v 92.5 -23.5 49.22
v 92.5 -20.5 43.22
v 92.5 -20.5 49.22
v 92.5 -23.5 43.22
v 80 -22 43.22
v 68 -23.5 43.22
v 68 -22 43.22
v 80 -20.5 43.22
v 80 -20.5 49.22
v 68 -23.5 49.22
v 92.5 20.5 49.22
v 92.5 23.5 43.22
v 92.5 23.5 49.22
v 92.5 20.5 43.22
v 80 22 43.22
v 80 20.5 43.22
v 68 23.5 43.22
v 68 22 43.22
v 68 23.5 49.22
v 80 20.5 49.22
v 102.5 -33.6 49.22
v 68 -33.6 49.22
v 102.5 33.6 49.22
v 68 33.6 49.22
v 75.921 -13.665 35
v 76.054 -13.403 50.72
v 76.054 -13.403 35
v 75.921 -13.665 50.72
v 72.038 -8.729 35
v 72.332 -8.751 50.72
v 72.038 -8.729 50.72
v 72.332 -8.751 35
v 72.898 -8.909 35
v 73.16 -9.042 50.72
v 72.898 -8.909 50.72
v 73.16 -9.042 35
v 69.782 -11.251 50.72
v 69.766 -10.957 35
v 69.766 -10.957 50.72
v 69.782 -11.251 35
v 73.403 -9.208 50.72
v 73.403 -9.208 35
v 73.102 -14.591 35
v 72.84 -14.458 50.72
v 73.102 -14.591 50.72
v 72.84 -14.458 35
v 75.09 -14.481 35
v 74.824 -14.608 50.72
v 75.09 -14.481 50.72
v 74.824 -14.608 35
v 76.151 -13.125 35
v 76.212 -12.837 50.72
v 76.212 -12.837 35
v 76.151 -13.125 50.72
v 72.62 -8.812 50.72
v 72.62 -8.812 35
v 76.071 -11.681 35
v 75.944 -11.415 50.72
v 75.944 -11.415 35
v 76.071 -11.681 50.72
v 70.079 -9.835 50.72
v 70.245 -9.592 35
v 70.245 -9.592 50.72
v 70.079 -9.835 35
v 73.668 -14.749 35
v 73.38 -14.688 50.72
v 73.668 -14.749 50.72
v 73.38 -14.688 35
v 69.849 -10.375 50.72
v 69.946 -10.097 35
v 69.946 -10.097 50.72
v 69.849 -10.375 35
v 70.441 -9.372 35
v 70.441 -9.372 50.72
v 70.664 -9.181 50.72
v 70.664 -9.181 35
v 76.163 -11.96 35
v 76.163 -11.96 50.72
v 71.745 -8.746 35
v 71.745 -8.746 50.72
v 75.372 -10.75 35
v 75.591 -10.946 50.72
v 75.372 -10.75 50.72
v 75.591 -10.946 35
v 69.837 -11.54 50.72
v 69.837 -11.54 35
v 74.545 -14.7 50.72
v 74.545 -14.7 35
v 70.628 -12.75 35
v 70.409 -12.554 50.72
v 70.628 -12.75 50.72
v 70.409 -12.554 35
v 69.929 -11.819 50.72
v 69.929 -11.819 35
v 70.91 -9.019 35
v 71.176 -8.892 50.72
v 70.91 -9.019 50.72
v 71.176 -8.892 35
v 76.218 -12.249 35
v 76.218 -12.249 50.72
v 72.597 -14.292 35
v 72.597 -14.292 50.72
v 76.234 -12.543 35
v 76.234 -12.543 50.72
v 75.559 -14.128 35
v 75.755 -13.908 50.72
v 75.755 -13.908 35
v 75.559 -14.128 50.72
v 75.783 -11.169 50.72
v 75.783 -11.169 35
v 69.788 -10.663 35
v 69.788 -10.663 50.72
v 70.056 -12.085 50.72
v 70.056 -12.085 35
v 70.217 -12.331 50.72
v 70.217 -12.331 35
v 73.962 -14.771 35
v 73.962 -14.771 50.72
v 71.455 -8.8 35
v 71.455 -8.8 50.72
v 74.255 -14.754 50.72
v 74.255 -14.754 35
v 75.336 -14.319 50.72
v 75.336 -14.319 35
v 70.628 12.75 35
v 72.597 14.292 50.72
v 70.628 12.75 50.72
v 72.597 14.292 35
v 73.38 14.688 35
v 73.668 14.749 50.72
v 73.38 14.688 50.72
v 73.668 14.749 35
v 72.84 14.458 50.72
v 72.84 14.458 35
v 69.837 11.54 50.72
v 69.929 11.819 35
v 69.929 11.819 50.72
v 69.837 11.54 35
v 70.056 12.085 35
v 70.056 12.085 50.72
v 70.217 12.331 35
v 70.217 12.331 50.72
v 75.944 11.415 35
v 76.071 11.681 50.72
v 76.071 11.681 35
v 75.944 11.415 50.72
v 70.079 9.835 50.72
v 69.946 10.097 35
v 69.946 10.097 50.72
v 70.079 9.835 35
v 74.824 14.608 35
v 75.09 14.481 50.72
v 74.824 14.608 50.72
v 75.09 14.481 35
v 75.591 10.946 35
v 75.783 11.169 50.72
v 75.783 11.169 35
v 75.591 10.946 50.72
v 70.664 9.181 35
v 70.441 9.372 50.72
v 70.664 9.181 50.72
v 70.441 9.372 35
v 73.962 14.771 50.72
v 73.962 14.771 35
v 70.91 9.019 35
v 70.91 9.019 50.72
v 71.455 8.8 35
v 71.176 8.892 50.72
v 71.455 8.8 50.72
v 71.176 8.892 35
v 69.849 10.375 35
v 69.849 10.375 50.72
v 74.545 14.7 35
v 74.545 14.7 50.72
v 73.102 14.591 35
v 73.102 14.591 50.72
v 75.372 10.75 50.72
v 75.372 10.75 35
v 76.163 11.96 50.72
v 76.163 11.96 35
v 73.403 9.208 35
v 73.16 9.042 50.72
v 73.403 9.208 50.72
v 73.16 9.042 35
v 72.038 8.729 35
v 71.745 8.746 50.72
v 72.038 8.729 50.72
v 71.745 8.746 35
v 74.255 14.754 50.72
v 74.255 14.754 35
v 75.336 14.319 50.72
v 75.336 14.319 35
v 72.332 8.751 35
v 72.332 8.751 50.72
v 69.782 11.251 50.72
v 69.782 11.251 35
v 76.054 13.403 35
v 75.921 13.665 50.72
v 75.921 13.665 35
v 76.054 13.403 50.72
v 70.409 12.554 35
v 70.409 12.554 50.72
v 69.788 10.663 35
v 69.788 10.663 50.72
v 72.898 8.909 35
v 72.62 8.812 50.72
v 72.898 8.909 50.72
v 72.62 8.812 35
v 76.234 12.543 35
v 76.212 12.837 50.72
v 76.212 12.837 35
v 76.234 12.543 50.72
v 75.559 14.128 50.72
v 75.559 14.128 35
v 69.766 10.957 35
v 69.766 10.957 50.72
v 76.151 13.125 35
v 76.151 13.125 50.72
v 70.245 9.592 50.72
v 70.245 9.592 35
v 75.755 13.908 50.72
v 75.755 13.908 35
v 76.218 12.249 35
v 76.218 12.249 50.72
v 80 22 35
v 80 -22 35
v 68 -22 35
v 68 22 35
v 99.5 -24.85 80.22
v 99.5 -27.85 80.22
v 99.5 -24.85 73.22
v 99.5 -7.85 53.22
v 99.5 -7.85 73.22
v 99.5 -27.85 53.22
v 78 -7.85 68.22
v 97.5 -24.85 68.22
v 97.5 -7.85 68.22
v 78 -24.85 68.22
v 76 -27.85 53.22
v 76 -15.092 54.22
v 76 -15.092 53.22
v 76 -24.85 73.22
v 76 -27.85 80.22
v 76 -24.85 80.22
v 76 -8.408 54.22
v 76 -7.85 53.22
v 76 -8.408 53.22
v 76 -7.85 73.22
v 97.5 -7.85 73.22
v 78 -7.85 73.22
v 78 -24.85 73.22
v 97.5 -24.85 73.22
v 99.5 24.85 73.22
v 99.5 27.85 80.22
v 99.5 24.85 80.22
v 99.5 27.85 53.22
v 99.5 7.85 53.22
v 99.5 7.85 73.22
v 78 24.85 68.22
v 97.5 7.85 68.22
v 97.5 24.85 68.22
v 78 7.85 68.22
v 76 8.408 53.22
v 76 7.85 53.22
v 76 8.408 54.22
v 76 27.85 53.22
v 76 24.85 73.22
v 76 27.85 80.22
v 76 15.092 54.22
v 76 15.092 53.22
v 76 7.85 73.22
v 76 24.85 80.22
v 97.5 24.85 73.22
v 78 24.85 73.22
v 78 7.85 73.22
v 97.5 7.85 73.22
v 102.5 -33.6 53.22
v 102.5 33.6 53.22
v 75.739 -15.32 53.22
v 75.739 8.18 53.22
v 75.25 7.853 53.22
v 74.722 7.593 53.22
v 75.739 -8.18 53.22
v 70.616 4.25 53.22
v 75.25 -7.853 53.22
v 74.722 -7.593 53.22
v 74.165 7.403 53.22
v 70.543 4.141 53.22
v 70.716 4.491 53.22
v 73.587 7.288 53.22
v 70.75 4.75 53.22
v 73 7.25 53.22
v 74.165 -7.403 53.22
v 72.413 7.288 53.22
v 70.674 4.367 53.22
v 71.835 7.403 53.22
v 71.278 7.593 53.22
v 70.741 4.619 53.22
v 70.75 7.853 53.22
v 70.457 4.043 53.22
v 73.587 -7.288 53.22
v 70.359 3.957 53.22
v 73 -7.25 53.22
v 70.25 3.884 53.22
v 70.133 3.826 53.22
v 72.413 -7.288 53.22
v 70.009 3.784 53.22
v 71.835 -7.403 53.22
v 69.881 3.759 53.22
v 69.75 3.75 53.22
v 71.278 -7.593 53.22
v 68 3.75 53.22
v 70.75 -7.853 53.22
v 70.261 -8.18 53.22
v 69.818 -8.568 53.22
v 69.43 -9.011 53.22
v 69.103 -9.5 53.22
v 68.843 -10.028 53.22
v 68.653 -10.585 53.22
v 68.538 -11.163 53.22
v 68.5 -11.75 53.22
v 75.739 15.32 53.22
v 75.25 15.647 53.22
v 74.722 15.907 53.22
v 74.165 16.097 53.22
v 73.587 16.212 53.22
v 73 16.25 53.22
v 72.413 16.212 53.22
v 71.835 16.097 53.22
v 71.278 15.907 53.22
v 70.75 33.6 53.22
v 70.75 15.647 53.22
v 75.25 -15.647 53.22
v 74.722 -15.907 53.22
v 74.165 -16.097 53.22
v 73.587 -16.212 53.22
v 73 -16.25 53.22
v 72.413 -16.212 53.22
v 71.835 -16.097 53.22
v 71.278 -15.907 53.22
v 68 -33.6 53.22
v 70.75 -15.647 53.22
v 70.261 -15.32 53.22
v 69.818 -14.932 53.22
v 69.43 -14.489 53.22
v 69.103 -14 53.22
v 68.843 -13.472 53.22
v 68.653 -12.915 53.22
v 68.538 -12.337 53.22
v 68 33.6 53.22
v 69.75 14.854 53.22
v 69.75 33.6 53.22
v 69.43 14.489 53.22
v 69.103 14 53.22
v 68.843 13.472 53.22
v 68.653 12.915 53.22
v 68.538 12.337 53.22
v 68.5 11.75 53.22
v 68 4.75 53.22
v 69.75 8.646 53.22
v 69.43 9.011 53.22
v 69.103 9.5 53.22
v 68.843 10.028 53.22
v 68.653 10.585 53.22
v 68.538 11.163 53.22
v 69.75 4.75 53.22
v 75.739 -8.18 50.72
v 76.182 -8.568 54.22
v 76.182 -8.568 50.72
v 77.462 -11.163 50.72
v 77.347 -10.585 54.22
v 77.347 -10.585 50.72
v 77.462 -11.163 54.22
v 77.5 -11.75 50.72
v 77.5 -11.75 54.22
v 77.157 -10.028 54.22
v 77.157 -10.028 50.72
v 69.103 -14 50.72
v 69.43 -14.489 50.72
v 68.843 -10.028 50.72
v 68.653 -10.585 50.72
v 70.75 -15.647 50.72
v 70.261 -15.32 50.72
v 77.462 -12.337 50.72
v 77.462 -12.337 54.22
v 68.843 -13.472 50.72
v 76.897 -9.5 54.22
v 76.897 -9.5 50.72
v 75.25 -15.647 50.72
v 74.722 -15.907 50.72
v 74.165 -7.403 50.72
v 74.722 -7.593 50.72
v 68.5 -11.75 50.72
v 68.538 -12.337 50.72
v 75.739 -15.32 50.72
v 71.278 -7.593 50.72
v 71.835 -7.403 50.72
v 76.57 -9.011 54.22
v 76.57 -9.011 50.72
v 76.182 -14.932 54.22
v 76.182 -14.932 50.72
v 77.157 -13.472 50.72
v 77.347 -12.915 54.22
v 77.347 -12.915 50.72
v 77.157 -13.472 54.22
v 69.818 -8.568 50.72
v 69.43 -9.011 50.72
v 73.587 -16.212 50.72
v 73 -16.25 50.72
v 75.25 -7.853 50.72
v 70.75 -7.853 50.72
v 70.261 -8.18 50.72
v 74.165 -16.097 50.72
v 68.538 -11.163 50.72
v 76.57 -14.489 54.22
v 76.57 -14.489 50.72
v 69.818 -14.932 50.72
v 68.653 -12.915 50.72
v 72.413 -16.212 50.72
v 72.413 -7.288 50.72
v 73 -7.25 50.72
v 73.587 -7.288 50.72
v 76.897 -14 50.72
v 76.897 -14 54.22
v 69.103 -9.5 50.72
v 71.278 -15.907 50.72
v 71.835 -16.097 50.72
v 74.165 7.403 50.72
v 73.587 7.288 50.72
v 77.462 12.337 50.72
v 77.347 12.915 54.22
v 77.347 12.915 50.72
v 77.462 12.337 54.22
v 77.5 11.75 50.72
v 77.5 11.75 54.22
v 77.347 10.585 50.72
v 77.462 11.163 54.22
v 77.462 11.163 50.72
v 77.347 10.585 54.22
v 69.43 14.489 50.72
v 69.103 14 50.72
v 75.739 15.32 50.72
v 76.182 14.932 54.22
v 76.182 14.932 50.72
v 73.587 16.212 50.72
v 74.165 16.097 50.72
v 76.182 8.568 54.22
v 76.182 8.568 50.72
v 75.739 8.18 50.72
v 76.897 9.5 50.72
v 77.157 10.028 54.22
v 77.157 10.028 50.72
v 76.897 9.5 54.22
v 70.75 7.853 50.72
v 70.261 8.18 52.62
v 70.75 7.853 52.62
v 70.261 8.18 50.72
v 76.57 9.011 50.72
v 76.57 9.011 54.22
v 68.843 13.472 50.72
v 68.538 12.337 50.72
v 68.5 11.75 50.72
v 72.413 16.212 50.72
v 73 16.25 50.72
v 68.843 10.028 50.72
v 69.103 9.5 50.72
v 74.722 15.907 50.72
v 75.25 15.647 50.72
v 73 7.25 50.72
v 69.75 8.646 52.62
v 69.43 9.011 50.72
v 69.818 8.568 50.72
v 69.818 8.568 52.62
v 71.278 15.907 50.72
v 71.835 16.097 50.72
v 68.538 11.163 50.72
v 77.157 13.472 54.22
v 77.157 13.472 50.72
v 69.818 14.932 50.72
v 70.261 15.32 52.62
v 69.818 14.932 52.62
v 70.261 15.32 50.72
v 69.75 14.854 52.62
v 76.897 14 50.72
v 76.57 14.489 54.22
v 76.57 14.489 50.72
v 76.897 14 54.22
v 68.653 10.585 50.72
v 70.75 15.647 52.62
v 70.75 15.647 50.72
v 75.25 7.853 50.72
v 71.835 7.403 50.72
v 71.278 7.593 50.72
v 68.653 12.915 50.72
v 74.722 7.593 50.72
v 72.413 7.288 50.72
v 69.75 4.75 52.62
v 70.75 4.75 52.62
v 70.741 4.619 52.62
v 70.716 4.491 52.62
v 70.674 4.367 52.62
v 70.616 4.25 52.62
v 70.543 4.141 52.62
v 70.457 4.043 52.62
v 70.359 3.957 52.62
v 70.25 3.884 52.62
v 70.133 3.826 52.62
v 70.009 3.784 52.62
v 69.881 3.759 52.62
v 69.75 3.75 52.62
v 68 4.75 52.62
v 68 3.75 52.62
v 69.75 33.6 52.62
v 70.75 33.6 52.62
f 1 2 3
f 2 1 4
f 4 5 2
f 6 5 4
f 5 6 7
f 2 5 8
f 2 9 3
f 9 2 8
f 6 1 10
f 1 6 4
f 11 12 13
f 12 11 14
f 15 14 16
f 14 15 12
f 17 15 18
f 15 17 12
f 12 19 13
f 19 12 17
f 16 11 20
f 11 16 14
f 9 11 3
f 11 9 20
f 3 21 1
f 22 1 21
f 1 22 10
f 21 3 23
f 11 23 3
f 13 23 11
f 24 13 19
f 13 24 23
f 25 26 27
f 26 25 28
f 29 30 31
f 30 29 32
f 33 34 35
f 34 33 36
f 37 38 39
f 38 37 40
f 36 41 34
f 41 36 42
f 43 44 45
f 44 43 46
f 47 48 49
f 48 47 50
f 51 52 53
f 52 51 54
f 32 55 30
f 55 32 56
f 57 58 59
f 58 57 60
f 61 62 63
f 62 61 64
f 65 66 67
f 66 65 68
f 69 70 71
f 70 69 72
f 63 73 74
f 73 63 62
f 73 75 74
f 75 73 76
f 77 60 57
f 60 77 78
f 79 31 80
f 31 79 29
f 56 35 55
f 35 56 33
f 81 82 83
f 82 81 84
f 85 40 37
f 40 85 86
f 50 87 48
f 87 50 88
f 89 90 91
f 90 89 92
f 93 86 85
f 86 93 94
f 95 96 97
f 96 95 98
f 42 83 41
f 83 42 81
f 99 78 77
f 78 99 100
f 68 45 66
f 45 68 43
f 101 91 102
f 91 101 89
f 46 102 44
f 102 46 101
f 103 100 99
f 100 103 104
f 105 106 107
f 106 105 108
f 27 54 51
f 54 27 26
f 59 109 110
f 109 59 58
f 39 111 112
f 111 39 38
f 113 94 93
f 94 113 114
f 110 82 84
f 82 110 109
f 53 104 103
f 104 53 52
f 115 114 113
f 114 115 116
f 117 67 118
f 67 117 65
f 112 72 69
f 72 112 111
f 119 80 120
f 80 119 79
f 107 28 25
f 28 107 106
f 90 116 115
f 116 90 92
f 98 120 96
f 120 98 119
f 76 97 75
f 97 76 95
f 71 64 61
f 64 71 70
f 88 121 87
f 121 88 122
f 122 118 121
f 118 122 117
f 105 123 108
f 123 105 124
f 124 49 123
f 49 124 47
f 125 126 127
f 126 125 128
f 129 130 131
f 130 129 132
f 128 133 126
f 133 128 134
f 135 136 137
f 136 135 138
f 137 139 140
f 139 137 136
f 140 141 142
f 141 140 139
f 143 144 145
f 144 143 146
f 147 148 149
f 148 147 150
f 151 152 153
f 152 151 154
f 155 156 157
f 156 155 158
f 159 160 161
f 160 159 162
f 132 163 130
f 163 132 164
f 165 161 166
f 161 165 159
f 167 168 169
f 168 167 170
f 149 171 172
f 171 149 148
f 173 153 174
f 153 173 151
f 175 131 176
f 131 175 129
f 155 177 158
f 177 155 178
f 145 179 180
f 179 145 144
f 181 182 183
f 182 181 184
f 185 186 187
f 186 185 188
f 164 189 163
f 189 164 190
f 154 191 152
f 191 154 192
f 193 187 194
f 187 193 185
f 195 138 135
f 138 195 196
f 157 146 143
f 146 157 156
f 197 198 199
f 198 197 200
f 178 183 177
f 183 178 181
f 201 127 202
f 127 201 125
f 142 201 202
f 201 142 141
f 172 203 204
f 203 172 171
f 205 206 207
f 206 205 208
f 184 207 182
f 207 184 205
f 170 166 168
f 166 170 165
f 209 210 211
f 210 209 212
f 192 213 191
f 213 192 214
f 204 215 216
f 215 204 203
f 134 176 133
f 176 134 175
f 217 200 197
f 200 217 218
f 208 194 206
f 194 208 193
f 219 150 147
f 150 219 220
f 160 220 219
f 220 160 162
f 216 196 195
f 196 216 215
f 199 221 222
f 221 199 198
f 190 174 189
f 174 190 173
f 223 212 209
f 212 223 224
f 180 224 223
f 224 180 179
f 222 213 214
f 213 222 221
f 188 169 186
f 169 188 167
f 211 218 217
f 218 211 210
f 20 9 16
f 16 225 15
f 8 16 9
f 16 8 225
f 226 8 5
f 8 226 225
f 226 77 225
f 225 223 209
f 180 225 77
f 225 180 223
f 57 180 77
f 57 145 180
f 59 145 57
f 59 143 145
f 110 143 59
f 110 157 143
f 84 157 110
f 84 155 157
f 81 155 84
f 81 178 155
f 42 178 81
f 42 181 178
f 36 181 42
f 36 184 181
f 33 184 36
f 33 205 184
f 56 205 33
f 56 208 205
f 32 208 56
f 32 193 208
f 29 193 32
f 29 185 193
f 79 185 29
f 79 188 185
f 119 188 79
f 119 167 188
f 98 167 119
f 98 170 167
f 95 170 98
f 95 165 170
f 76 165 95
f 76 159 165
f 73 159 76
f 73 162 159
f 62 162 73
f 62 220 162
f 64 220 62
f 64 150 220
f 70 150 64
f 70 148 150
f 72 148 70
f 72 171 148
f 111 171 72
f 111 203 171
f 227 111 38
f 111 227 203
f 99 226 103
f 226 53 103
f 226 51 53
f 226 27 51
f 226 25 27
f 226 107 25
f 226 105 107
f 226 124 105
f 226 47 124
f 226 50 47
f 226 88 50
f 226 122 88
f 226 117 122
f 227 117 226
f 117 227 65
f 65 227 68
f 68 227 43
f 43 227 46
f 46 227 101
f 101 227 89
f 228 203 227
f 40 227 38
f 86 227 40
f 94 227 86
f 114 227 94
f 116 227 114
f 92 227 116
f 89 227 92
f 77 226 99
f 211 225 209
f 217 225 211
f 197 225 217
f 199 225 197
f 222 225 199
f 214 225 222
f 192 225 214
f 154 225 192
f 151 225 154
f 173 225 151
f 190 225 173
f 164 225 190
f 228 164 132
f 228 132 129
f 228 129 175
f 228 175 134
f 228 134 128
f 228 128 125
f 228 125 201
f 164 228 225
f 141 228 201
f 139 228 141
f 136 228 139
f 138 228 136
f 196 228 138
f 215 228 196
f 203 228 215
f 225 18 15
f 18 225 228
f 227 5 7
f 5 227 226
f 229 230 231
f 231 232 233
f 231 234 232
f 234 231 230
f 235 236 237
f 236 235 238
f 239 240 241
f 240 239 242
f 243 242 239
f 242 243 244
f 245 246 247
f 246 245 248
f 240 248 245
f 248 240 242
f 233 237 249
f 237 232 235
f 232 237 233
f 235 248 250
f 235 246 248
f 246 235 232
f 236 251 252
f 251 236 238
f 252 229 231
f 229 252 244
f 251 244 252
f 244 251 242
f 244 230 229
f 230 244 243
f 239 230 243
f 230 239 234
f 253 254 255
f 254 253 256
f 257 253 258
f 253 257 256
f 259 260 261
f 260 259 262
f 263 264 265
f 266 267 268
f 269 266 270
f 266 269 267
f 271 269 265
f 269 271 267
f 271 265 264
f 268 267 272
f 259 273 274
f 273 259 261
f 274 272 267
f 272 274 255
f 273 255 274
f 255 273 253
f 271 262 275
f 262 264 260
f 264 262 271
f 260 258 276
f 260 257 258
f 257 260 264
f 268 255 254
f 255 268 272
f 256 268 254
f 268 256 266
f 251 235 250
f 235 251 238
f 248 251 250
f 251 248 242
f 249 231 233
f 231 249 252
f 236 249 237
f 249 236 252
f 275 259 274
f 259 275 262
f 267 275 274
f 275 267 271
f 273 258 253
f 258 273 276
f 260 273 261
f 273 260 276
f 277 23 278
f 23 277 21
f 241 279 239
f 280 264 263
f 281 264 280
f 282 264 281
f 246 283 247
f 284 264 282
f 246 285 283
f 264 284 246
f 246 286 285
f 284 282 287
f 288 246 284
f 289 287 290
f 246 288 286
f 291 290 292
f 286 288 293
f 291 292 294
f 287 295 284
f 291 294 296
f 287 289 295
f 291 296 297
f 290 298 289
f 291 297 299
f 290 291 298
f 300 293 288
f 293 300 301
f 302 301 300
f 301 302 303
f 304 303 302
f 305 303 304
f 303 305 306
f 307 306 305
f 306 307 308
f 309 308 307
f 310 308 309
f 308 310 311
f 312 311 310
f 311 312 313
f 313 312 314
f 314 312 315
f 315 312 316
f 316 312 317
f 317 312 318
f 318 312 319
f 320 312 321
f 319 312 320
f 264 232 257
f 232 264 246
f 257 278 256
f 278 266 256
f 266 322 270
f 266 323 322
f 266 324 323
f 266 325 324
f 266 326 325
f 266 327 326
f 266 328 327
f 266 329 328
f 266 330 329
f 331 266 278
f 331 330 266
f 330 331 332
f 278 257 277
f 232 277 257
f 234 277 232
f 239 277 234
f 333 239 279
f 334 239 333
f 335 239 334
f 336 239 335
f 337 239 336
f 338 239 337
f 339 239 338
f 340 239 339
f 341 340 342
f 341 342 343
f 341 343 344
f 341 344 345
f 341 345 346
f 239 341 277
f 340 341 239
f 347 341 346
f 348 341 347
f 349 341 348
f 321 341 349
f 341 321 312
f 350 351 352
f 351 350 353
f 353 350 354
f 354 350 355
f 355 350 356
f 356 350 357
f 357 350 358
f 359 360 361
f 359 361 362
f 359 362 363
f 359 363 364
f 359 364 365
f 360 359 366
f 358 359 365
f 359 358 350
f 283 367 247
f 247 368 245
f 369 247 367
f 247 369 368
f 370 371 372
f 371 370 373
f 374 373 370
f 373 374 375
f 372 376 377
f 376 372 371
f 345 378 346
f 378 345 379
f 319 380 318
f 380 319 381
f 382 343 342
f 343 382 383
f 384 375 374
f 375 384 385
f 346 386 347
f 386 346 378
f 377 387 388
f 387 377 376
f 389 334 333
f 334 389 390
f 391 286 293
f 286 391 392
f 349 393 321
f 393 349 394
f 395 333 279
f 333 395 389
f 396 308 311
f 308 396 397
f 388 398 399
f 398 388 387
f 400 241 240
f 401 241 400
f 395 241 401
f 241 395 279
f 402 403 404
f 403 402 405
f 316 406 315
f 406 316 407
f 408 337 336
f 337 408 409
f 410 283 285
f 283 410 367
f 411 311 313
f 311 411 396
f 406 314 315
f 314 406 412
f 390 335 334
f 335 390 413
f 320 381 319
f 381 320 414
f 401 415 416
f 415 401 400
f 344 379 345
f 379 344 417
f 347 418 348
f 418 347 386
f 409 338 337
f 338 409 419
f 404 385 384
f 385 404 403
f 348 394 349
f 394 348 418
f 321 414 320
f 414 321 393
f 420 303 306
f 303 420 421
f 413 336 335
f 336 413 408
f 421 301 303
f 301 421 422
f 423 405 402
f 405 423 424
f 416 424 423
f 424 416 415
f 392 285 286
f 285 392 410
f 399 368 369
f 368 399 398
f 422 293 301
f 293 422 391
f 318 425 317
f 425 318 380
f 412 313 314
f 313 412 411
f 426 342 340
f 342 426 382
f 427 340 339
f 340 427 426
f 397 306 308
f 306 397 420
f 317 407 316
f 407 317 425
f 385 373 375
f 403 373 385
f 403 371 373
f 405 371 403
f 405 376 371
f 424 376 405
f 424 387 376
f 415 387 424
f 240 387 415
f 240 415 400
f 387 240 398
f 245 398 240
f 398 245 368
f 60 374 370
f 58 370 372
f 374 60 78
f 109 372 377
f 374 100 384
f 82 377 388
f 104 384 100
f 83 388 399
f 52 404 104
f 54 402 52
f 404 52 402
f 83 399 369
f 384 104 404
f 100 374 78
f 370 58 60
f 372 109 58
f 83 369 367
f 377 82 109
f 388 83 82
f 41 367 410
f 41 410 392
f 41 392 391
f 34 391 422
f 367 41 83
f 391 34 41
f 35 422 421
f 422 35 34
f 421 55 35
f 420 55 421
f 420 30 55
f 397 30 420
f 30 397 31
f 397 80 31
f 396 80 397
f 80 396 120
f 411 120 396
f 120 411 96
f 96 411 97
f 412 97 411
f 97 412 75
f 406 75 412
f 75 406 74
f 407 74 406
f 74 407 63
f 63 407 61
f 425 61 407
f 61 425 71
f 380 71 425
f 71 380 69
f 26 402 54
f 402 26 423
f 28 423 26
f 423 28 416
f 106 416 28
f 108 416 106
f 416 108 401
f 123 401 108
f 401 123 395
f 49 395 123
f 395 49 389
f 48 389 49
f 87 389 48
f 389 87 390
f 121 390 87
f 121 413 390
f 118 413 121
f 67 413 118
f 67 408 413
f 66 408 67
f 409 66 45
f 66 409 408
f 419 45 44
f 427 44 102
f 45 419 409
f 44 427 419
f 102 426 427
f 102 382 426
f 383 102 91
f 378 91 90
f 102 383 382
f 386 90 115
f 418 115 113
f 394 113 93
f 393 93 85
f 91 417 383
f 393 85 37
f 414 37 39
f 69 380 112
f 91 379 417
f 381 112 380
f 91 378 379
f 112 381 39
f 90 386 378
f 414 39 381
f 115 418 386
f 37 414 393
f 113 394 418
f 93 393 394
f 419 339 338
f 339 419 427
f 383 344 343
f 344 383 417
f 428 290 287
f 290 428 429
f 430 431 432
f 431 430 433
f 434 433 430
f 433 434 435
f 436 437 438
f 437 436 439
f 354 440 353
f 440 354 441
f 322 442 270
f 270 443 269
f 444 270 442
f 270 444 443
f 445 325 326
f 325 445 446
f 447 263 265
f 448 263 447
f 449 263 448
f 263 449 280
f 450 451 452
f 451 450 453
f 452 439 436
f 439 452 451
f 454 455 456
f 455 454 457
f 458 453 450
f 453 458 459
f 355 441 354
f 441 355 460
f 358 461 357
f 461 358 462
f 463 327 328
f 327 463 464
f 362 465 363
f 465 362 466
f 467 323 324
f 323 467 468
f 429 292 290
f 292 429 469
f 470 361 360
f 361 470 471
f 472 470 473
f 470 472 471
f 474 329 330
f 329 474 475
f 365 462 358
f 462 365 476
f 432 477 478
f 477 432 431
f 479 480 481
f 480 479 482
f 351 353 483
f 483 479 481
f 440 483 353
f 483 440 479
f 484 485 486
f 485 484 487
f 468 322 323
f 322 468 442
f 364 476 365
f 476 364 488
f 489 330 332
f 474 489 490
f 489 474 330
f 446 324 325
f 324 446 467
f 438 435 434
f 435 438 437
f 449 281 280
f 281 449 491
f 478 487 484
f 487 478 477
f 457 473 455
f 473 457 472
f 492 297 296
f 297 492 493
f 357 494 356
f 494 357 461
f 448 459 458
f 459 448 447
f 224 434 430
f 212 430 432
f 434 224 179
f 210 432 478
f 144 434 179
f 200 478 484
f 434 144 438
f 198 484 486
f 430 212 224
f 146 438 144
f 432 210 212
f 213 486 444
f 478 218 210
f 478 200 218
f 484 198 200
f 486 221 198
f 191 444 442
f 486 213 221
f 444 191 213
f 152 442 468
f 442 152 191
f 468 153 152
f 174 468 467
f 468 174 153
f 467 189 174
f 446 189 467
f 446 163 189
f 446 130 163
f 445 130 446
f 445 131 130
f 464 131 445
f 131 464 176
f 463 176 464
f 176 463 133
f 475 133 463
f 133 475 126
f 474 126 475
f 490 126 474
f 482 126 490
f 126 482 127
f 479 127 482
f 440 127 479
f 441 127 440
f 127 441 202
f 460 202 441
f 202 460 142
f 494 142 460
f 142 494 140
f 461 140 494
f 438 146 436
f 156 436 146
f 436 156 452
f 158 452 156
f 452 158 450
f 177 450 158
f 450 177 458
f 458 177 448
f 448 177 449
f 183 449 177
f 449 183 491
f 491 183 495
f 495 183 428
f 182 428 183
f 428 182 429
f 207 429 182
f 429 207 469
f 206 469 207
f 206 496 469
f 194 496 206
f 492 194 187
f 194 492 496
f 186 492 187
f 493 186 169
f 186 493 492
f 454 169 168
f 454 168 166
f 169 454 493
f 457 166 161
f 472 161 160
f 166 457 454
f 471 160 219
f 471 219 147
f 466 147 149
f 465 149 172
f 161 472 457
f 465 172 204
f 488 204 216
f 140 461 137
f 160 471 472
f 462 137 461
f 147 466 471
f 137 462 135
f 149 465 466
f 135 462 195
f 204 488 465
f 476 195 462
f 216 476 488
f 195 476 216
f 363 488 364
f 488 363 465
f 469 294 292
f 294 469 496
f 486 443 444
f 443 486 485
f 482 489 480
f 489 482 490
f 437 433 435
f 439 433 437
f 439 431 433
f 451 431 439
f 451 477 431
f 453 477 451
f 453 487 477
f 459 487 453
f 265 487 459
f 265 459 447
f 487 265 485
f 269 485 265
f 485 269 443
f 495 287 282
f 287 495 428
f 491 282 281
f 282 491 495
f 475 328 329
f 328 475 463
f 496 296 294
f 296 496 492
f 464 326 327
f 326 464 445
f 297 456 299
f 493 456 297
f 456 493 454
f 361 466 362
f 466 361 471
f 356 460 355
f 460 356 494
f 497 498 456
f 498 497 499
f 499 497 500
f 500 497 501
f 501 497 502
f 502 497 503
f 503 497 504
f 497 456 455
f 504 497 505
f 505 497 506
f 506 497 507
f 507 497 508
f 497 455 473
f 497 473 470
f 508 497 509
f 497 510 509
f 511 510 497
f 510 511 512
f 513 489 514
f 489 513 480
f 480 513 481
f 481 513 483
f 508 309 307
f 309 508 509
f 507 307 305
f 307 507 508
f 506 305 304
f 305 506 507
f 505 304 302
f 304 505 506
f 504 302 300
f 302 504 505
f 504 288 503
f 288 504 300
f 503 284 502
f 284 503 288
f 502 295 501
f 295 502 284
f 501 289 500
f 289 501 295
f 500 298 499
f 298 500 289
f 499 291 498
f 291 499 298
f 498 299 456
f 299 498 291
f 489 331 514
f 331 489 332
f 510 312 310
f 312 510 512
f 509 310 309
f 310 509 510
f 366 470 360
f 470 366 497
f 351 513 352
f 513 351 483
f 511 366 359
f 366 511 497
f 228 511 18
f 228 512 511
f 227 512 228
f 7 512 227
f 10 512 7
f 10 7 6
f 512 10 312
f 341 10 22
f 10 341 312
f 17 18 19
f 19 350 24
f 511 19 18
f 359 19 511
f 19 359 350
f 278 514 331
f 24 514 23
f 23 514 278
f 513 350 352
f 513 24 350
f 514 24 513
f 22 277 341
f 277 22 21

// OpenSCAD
// Quick print to validate the sonar cradle: both towers, end walls and lips on a patch of plate.
// Drop the assembled case in with its jumper connectors on; the connectors hang in the channel.
include <chassis.scad>
coupon_only = true;
show_ghosts = false;
module coupon() {
    intersection() {
        chassis();
        translate([sonar_x_front - sonar_case_d - 2 * sonar_lip - clr - 8, sonar_y - sonar_case_w / 2 - sonar_wall_t - 6, 0])
            cube([sonar_case_d + 2 * sonar_lip + clr + 12, sonar_case_w + 2 * sonar_wall_t + 12, 100]);
    }
}
coupon();
